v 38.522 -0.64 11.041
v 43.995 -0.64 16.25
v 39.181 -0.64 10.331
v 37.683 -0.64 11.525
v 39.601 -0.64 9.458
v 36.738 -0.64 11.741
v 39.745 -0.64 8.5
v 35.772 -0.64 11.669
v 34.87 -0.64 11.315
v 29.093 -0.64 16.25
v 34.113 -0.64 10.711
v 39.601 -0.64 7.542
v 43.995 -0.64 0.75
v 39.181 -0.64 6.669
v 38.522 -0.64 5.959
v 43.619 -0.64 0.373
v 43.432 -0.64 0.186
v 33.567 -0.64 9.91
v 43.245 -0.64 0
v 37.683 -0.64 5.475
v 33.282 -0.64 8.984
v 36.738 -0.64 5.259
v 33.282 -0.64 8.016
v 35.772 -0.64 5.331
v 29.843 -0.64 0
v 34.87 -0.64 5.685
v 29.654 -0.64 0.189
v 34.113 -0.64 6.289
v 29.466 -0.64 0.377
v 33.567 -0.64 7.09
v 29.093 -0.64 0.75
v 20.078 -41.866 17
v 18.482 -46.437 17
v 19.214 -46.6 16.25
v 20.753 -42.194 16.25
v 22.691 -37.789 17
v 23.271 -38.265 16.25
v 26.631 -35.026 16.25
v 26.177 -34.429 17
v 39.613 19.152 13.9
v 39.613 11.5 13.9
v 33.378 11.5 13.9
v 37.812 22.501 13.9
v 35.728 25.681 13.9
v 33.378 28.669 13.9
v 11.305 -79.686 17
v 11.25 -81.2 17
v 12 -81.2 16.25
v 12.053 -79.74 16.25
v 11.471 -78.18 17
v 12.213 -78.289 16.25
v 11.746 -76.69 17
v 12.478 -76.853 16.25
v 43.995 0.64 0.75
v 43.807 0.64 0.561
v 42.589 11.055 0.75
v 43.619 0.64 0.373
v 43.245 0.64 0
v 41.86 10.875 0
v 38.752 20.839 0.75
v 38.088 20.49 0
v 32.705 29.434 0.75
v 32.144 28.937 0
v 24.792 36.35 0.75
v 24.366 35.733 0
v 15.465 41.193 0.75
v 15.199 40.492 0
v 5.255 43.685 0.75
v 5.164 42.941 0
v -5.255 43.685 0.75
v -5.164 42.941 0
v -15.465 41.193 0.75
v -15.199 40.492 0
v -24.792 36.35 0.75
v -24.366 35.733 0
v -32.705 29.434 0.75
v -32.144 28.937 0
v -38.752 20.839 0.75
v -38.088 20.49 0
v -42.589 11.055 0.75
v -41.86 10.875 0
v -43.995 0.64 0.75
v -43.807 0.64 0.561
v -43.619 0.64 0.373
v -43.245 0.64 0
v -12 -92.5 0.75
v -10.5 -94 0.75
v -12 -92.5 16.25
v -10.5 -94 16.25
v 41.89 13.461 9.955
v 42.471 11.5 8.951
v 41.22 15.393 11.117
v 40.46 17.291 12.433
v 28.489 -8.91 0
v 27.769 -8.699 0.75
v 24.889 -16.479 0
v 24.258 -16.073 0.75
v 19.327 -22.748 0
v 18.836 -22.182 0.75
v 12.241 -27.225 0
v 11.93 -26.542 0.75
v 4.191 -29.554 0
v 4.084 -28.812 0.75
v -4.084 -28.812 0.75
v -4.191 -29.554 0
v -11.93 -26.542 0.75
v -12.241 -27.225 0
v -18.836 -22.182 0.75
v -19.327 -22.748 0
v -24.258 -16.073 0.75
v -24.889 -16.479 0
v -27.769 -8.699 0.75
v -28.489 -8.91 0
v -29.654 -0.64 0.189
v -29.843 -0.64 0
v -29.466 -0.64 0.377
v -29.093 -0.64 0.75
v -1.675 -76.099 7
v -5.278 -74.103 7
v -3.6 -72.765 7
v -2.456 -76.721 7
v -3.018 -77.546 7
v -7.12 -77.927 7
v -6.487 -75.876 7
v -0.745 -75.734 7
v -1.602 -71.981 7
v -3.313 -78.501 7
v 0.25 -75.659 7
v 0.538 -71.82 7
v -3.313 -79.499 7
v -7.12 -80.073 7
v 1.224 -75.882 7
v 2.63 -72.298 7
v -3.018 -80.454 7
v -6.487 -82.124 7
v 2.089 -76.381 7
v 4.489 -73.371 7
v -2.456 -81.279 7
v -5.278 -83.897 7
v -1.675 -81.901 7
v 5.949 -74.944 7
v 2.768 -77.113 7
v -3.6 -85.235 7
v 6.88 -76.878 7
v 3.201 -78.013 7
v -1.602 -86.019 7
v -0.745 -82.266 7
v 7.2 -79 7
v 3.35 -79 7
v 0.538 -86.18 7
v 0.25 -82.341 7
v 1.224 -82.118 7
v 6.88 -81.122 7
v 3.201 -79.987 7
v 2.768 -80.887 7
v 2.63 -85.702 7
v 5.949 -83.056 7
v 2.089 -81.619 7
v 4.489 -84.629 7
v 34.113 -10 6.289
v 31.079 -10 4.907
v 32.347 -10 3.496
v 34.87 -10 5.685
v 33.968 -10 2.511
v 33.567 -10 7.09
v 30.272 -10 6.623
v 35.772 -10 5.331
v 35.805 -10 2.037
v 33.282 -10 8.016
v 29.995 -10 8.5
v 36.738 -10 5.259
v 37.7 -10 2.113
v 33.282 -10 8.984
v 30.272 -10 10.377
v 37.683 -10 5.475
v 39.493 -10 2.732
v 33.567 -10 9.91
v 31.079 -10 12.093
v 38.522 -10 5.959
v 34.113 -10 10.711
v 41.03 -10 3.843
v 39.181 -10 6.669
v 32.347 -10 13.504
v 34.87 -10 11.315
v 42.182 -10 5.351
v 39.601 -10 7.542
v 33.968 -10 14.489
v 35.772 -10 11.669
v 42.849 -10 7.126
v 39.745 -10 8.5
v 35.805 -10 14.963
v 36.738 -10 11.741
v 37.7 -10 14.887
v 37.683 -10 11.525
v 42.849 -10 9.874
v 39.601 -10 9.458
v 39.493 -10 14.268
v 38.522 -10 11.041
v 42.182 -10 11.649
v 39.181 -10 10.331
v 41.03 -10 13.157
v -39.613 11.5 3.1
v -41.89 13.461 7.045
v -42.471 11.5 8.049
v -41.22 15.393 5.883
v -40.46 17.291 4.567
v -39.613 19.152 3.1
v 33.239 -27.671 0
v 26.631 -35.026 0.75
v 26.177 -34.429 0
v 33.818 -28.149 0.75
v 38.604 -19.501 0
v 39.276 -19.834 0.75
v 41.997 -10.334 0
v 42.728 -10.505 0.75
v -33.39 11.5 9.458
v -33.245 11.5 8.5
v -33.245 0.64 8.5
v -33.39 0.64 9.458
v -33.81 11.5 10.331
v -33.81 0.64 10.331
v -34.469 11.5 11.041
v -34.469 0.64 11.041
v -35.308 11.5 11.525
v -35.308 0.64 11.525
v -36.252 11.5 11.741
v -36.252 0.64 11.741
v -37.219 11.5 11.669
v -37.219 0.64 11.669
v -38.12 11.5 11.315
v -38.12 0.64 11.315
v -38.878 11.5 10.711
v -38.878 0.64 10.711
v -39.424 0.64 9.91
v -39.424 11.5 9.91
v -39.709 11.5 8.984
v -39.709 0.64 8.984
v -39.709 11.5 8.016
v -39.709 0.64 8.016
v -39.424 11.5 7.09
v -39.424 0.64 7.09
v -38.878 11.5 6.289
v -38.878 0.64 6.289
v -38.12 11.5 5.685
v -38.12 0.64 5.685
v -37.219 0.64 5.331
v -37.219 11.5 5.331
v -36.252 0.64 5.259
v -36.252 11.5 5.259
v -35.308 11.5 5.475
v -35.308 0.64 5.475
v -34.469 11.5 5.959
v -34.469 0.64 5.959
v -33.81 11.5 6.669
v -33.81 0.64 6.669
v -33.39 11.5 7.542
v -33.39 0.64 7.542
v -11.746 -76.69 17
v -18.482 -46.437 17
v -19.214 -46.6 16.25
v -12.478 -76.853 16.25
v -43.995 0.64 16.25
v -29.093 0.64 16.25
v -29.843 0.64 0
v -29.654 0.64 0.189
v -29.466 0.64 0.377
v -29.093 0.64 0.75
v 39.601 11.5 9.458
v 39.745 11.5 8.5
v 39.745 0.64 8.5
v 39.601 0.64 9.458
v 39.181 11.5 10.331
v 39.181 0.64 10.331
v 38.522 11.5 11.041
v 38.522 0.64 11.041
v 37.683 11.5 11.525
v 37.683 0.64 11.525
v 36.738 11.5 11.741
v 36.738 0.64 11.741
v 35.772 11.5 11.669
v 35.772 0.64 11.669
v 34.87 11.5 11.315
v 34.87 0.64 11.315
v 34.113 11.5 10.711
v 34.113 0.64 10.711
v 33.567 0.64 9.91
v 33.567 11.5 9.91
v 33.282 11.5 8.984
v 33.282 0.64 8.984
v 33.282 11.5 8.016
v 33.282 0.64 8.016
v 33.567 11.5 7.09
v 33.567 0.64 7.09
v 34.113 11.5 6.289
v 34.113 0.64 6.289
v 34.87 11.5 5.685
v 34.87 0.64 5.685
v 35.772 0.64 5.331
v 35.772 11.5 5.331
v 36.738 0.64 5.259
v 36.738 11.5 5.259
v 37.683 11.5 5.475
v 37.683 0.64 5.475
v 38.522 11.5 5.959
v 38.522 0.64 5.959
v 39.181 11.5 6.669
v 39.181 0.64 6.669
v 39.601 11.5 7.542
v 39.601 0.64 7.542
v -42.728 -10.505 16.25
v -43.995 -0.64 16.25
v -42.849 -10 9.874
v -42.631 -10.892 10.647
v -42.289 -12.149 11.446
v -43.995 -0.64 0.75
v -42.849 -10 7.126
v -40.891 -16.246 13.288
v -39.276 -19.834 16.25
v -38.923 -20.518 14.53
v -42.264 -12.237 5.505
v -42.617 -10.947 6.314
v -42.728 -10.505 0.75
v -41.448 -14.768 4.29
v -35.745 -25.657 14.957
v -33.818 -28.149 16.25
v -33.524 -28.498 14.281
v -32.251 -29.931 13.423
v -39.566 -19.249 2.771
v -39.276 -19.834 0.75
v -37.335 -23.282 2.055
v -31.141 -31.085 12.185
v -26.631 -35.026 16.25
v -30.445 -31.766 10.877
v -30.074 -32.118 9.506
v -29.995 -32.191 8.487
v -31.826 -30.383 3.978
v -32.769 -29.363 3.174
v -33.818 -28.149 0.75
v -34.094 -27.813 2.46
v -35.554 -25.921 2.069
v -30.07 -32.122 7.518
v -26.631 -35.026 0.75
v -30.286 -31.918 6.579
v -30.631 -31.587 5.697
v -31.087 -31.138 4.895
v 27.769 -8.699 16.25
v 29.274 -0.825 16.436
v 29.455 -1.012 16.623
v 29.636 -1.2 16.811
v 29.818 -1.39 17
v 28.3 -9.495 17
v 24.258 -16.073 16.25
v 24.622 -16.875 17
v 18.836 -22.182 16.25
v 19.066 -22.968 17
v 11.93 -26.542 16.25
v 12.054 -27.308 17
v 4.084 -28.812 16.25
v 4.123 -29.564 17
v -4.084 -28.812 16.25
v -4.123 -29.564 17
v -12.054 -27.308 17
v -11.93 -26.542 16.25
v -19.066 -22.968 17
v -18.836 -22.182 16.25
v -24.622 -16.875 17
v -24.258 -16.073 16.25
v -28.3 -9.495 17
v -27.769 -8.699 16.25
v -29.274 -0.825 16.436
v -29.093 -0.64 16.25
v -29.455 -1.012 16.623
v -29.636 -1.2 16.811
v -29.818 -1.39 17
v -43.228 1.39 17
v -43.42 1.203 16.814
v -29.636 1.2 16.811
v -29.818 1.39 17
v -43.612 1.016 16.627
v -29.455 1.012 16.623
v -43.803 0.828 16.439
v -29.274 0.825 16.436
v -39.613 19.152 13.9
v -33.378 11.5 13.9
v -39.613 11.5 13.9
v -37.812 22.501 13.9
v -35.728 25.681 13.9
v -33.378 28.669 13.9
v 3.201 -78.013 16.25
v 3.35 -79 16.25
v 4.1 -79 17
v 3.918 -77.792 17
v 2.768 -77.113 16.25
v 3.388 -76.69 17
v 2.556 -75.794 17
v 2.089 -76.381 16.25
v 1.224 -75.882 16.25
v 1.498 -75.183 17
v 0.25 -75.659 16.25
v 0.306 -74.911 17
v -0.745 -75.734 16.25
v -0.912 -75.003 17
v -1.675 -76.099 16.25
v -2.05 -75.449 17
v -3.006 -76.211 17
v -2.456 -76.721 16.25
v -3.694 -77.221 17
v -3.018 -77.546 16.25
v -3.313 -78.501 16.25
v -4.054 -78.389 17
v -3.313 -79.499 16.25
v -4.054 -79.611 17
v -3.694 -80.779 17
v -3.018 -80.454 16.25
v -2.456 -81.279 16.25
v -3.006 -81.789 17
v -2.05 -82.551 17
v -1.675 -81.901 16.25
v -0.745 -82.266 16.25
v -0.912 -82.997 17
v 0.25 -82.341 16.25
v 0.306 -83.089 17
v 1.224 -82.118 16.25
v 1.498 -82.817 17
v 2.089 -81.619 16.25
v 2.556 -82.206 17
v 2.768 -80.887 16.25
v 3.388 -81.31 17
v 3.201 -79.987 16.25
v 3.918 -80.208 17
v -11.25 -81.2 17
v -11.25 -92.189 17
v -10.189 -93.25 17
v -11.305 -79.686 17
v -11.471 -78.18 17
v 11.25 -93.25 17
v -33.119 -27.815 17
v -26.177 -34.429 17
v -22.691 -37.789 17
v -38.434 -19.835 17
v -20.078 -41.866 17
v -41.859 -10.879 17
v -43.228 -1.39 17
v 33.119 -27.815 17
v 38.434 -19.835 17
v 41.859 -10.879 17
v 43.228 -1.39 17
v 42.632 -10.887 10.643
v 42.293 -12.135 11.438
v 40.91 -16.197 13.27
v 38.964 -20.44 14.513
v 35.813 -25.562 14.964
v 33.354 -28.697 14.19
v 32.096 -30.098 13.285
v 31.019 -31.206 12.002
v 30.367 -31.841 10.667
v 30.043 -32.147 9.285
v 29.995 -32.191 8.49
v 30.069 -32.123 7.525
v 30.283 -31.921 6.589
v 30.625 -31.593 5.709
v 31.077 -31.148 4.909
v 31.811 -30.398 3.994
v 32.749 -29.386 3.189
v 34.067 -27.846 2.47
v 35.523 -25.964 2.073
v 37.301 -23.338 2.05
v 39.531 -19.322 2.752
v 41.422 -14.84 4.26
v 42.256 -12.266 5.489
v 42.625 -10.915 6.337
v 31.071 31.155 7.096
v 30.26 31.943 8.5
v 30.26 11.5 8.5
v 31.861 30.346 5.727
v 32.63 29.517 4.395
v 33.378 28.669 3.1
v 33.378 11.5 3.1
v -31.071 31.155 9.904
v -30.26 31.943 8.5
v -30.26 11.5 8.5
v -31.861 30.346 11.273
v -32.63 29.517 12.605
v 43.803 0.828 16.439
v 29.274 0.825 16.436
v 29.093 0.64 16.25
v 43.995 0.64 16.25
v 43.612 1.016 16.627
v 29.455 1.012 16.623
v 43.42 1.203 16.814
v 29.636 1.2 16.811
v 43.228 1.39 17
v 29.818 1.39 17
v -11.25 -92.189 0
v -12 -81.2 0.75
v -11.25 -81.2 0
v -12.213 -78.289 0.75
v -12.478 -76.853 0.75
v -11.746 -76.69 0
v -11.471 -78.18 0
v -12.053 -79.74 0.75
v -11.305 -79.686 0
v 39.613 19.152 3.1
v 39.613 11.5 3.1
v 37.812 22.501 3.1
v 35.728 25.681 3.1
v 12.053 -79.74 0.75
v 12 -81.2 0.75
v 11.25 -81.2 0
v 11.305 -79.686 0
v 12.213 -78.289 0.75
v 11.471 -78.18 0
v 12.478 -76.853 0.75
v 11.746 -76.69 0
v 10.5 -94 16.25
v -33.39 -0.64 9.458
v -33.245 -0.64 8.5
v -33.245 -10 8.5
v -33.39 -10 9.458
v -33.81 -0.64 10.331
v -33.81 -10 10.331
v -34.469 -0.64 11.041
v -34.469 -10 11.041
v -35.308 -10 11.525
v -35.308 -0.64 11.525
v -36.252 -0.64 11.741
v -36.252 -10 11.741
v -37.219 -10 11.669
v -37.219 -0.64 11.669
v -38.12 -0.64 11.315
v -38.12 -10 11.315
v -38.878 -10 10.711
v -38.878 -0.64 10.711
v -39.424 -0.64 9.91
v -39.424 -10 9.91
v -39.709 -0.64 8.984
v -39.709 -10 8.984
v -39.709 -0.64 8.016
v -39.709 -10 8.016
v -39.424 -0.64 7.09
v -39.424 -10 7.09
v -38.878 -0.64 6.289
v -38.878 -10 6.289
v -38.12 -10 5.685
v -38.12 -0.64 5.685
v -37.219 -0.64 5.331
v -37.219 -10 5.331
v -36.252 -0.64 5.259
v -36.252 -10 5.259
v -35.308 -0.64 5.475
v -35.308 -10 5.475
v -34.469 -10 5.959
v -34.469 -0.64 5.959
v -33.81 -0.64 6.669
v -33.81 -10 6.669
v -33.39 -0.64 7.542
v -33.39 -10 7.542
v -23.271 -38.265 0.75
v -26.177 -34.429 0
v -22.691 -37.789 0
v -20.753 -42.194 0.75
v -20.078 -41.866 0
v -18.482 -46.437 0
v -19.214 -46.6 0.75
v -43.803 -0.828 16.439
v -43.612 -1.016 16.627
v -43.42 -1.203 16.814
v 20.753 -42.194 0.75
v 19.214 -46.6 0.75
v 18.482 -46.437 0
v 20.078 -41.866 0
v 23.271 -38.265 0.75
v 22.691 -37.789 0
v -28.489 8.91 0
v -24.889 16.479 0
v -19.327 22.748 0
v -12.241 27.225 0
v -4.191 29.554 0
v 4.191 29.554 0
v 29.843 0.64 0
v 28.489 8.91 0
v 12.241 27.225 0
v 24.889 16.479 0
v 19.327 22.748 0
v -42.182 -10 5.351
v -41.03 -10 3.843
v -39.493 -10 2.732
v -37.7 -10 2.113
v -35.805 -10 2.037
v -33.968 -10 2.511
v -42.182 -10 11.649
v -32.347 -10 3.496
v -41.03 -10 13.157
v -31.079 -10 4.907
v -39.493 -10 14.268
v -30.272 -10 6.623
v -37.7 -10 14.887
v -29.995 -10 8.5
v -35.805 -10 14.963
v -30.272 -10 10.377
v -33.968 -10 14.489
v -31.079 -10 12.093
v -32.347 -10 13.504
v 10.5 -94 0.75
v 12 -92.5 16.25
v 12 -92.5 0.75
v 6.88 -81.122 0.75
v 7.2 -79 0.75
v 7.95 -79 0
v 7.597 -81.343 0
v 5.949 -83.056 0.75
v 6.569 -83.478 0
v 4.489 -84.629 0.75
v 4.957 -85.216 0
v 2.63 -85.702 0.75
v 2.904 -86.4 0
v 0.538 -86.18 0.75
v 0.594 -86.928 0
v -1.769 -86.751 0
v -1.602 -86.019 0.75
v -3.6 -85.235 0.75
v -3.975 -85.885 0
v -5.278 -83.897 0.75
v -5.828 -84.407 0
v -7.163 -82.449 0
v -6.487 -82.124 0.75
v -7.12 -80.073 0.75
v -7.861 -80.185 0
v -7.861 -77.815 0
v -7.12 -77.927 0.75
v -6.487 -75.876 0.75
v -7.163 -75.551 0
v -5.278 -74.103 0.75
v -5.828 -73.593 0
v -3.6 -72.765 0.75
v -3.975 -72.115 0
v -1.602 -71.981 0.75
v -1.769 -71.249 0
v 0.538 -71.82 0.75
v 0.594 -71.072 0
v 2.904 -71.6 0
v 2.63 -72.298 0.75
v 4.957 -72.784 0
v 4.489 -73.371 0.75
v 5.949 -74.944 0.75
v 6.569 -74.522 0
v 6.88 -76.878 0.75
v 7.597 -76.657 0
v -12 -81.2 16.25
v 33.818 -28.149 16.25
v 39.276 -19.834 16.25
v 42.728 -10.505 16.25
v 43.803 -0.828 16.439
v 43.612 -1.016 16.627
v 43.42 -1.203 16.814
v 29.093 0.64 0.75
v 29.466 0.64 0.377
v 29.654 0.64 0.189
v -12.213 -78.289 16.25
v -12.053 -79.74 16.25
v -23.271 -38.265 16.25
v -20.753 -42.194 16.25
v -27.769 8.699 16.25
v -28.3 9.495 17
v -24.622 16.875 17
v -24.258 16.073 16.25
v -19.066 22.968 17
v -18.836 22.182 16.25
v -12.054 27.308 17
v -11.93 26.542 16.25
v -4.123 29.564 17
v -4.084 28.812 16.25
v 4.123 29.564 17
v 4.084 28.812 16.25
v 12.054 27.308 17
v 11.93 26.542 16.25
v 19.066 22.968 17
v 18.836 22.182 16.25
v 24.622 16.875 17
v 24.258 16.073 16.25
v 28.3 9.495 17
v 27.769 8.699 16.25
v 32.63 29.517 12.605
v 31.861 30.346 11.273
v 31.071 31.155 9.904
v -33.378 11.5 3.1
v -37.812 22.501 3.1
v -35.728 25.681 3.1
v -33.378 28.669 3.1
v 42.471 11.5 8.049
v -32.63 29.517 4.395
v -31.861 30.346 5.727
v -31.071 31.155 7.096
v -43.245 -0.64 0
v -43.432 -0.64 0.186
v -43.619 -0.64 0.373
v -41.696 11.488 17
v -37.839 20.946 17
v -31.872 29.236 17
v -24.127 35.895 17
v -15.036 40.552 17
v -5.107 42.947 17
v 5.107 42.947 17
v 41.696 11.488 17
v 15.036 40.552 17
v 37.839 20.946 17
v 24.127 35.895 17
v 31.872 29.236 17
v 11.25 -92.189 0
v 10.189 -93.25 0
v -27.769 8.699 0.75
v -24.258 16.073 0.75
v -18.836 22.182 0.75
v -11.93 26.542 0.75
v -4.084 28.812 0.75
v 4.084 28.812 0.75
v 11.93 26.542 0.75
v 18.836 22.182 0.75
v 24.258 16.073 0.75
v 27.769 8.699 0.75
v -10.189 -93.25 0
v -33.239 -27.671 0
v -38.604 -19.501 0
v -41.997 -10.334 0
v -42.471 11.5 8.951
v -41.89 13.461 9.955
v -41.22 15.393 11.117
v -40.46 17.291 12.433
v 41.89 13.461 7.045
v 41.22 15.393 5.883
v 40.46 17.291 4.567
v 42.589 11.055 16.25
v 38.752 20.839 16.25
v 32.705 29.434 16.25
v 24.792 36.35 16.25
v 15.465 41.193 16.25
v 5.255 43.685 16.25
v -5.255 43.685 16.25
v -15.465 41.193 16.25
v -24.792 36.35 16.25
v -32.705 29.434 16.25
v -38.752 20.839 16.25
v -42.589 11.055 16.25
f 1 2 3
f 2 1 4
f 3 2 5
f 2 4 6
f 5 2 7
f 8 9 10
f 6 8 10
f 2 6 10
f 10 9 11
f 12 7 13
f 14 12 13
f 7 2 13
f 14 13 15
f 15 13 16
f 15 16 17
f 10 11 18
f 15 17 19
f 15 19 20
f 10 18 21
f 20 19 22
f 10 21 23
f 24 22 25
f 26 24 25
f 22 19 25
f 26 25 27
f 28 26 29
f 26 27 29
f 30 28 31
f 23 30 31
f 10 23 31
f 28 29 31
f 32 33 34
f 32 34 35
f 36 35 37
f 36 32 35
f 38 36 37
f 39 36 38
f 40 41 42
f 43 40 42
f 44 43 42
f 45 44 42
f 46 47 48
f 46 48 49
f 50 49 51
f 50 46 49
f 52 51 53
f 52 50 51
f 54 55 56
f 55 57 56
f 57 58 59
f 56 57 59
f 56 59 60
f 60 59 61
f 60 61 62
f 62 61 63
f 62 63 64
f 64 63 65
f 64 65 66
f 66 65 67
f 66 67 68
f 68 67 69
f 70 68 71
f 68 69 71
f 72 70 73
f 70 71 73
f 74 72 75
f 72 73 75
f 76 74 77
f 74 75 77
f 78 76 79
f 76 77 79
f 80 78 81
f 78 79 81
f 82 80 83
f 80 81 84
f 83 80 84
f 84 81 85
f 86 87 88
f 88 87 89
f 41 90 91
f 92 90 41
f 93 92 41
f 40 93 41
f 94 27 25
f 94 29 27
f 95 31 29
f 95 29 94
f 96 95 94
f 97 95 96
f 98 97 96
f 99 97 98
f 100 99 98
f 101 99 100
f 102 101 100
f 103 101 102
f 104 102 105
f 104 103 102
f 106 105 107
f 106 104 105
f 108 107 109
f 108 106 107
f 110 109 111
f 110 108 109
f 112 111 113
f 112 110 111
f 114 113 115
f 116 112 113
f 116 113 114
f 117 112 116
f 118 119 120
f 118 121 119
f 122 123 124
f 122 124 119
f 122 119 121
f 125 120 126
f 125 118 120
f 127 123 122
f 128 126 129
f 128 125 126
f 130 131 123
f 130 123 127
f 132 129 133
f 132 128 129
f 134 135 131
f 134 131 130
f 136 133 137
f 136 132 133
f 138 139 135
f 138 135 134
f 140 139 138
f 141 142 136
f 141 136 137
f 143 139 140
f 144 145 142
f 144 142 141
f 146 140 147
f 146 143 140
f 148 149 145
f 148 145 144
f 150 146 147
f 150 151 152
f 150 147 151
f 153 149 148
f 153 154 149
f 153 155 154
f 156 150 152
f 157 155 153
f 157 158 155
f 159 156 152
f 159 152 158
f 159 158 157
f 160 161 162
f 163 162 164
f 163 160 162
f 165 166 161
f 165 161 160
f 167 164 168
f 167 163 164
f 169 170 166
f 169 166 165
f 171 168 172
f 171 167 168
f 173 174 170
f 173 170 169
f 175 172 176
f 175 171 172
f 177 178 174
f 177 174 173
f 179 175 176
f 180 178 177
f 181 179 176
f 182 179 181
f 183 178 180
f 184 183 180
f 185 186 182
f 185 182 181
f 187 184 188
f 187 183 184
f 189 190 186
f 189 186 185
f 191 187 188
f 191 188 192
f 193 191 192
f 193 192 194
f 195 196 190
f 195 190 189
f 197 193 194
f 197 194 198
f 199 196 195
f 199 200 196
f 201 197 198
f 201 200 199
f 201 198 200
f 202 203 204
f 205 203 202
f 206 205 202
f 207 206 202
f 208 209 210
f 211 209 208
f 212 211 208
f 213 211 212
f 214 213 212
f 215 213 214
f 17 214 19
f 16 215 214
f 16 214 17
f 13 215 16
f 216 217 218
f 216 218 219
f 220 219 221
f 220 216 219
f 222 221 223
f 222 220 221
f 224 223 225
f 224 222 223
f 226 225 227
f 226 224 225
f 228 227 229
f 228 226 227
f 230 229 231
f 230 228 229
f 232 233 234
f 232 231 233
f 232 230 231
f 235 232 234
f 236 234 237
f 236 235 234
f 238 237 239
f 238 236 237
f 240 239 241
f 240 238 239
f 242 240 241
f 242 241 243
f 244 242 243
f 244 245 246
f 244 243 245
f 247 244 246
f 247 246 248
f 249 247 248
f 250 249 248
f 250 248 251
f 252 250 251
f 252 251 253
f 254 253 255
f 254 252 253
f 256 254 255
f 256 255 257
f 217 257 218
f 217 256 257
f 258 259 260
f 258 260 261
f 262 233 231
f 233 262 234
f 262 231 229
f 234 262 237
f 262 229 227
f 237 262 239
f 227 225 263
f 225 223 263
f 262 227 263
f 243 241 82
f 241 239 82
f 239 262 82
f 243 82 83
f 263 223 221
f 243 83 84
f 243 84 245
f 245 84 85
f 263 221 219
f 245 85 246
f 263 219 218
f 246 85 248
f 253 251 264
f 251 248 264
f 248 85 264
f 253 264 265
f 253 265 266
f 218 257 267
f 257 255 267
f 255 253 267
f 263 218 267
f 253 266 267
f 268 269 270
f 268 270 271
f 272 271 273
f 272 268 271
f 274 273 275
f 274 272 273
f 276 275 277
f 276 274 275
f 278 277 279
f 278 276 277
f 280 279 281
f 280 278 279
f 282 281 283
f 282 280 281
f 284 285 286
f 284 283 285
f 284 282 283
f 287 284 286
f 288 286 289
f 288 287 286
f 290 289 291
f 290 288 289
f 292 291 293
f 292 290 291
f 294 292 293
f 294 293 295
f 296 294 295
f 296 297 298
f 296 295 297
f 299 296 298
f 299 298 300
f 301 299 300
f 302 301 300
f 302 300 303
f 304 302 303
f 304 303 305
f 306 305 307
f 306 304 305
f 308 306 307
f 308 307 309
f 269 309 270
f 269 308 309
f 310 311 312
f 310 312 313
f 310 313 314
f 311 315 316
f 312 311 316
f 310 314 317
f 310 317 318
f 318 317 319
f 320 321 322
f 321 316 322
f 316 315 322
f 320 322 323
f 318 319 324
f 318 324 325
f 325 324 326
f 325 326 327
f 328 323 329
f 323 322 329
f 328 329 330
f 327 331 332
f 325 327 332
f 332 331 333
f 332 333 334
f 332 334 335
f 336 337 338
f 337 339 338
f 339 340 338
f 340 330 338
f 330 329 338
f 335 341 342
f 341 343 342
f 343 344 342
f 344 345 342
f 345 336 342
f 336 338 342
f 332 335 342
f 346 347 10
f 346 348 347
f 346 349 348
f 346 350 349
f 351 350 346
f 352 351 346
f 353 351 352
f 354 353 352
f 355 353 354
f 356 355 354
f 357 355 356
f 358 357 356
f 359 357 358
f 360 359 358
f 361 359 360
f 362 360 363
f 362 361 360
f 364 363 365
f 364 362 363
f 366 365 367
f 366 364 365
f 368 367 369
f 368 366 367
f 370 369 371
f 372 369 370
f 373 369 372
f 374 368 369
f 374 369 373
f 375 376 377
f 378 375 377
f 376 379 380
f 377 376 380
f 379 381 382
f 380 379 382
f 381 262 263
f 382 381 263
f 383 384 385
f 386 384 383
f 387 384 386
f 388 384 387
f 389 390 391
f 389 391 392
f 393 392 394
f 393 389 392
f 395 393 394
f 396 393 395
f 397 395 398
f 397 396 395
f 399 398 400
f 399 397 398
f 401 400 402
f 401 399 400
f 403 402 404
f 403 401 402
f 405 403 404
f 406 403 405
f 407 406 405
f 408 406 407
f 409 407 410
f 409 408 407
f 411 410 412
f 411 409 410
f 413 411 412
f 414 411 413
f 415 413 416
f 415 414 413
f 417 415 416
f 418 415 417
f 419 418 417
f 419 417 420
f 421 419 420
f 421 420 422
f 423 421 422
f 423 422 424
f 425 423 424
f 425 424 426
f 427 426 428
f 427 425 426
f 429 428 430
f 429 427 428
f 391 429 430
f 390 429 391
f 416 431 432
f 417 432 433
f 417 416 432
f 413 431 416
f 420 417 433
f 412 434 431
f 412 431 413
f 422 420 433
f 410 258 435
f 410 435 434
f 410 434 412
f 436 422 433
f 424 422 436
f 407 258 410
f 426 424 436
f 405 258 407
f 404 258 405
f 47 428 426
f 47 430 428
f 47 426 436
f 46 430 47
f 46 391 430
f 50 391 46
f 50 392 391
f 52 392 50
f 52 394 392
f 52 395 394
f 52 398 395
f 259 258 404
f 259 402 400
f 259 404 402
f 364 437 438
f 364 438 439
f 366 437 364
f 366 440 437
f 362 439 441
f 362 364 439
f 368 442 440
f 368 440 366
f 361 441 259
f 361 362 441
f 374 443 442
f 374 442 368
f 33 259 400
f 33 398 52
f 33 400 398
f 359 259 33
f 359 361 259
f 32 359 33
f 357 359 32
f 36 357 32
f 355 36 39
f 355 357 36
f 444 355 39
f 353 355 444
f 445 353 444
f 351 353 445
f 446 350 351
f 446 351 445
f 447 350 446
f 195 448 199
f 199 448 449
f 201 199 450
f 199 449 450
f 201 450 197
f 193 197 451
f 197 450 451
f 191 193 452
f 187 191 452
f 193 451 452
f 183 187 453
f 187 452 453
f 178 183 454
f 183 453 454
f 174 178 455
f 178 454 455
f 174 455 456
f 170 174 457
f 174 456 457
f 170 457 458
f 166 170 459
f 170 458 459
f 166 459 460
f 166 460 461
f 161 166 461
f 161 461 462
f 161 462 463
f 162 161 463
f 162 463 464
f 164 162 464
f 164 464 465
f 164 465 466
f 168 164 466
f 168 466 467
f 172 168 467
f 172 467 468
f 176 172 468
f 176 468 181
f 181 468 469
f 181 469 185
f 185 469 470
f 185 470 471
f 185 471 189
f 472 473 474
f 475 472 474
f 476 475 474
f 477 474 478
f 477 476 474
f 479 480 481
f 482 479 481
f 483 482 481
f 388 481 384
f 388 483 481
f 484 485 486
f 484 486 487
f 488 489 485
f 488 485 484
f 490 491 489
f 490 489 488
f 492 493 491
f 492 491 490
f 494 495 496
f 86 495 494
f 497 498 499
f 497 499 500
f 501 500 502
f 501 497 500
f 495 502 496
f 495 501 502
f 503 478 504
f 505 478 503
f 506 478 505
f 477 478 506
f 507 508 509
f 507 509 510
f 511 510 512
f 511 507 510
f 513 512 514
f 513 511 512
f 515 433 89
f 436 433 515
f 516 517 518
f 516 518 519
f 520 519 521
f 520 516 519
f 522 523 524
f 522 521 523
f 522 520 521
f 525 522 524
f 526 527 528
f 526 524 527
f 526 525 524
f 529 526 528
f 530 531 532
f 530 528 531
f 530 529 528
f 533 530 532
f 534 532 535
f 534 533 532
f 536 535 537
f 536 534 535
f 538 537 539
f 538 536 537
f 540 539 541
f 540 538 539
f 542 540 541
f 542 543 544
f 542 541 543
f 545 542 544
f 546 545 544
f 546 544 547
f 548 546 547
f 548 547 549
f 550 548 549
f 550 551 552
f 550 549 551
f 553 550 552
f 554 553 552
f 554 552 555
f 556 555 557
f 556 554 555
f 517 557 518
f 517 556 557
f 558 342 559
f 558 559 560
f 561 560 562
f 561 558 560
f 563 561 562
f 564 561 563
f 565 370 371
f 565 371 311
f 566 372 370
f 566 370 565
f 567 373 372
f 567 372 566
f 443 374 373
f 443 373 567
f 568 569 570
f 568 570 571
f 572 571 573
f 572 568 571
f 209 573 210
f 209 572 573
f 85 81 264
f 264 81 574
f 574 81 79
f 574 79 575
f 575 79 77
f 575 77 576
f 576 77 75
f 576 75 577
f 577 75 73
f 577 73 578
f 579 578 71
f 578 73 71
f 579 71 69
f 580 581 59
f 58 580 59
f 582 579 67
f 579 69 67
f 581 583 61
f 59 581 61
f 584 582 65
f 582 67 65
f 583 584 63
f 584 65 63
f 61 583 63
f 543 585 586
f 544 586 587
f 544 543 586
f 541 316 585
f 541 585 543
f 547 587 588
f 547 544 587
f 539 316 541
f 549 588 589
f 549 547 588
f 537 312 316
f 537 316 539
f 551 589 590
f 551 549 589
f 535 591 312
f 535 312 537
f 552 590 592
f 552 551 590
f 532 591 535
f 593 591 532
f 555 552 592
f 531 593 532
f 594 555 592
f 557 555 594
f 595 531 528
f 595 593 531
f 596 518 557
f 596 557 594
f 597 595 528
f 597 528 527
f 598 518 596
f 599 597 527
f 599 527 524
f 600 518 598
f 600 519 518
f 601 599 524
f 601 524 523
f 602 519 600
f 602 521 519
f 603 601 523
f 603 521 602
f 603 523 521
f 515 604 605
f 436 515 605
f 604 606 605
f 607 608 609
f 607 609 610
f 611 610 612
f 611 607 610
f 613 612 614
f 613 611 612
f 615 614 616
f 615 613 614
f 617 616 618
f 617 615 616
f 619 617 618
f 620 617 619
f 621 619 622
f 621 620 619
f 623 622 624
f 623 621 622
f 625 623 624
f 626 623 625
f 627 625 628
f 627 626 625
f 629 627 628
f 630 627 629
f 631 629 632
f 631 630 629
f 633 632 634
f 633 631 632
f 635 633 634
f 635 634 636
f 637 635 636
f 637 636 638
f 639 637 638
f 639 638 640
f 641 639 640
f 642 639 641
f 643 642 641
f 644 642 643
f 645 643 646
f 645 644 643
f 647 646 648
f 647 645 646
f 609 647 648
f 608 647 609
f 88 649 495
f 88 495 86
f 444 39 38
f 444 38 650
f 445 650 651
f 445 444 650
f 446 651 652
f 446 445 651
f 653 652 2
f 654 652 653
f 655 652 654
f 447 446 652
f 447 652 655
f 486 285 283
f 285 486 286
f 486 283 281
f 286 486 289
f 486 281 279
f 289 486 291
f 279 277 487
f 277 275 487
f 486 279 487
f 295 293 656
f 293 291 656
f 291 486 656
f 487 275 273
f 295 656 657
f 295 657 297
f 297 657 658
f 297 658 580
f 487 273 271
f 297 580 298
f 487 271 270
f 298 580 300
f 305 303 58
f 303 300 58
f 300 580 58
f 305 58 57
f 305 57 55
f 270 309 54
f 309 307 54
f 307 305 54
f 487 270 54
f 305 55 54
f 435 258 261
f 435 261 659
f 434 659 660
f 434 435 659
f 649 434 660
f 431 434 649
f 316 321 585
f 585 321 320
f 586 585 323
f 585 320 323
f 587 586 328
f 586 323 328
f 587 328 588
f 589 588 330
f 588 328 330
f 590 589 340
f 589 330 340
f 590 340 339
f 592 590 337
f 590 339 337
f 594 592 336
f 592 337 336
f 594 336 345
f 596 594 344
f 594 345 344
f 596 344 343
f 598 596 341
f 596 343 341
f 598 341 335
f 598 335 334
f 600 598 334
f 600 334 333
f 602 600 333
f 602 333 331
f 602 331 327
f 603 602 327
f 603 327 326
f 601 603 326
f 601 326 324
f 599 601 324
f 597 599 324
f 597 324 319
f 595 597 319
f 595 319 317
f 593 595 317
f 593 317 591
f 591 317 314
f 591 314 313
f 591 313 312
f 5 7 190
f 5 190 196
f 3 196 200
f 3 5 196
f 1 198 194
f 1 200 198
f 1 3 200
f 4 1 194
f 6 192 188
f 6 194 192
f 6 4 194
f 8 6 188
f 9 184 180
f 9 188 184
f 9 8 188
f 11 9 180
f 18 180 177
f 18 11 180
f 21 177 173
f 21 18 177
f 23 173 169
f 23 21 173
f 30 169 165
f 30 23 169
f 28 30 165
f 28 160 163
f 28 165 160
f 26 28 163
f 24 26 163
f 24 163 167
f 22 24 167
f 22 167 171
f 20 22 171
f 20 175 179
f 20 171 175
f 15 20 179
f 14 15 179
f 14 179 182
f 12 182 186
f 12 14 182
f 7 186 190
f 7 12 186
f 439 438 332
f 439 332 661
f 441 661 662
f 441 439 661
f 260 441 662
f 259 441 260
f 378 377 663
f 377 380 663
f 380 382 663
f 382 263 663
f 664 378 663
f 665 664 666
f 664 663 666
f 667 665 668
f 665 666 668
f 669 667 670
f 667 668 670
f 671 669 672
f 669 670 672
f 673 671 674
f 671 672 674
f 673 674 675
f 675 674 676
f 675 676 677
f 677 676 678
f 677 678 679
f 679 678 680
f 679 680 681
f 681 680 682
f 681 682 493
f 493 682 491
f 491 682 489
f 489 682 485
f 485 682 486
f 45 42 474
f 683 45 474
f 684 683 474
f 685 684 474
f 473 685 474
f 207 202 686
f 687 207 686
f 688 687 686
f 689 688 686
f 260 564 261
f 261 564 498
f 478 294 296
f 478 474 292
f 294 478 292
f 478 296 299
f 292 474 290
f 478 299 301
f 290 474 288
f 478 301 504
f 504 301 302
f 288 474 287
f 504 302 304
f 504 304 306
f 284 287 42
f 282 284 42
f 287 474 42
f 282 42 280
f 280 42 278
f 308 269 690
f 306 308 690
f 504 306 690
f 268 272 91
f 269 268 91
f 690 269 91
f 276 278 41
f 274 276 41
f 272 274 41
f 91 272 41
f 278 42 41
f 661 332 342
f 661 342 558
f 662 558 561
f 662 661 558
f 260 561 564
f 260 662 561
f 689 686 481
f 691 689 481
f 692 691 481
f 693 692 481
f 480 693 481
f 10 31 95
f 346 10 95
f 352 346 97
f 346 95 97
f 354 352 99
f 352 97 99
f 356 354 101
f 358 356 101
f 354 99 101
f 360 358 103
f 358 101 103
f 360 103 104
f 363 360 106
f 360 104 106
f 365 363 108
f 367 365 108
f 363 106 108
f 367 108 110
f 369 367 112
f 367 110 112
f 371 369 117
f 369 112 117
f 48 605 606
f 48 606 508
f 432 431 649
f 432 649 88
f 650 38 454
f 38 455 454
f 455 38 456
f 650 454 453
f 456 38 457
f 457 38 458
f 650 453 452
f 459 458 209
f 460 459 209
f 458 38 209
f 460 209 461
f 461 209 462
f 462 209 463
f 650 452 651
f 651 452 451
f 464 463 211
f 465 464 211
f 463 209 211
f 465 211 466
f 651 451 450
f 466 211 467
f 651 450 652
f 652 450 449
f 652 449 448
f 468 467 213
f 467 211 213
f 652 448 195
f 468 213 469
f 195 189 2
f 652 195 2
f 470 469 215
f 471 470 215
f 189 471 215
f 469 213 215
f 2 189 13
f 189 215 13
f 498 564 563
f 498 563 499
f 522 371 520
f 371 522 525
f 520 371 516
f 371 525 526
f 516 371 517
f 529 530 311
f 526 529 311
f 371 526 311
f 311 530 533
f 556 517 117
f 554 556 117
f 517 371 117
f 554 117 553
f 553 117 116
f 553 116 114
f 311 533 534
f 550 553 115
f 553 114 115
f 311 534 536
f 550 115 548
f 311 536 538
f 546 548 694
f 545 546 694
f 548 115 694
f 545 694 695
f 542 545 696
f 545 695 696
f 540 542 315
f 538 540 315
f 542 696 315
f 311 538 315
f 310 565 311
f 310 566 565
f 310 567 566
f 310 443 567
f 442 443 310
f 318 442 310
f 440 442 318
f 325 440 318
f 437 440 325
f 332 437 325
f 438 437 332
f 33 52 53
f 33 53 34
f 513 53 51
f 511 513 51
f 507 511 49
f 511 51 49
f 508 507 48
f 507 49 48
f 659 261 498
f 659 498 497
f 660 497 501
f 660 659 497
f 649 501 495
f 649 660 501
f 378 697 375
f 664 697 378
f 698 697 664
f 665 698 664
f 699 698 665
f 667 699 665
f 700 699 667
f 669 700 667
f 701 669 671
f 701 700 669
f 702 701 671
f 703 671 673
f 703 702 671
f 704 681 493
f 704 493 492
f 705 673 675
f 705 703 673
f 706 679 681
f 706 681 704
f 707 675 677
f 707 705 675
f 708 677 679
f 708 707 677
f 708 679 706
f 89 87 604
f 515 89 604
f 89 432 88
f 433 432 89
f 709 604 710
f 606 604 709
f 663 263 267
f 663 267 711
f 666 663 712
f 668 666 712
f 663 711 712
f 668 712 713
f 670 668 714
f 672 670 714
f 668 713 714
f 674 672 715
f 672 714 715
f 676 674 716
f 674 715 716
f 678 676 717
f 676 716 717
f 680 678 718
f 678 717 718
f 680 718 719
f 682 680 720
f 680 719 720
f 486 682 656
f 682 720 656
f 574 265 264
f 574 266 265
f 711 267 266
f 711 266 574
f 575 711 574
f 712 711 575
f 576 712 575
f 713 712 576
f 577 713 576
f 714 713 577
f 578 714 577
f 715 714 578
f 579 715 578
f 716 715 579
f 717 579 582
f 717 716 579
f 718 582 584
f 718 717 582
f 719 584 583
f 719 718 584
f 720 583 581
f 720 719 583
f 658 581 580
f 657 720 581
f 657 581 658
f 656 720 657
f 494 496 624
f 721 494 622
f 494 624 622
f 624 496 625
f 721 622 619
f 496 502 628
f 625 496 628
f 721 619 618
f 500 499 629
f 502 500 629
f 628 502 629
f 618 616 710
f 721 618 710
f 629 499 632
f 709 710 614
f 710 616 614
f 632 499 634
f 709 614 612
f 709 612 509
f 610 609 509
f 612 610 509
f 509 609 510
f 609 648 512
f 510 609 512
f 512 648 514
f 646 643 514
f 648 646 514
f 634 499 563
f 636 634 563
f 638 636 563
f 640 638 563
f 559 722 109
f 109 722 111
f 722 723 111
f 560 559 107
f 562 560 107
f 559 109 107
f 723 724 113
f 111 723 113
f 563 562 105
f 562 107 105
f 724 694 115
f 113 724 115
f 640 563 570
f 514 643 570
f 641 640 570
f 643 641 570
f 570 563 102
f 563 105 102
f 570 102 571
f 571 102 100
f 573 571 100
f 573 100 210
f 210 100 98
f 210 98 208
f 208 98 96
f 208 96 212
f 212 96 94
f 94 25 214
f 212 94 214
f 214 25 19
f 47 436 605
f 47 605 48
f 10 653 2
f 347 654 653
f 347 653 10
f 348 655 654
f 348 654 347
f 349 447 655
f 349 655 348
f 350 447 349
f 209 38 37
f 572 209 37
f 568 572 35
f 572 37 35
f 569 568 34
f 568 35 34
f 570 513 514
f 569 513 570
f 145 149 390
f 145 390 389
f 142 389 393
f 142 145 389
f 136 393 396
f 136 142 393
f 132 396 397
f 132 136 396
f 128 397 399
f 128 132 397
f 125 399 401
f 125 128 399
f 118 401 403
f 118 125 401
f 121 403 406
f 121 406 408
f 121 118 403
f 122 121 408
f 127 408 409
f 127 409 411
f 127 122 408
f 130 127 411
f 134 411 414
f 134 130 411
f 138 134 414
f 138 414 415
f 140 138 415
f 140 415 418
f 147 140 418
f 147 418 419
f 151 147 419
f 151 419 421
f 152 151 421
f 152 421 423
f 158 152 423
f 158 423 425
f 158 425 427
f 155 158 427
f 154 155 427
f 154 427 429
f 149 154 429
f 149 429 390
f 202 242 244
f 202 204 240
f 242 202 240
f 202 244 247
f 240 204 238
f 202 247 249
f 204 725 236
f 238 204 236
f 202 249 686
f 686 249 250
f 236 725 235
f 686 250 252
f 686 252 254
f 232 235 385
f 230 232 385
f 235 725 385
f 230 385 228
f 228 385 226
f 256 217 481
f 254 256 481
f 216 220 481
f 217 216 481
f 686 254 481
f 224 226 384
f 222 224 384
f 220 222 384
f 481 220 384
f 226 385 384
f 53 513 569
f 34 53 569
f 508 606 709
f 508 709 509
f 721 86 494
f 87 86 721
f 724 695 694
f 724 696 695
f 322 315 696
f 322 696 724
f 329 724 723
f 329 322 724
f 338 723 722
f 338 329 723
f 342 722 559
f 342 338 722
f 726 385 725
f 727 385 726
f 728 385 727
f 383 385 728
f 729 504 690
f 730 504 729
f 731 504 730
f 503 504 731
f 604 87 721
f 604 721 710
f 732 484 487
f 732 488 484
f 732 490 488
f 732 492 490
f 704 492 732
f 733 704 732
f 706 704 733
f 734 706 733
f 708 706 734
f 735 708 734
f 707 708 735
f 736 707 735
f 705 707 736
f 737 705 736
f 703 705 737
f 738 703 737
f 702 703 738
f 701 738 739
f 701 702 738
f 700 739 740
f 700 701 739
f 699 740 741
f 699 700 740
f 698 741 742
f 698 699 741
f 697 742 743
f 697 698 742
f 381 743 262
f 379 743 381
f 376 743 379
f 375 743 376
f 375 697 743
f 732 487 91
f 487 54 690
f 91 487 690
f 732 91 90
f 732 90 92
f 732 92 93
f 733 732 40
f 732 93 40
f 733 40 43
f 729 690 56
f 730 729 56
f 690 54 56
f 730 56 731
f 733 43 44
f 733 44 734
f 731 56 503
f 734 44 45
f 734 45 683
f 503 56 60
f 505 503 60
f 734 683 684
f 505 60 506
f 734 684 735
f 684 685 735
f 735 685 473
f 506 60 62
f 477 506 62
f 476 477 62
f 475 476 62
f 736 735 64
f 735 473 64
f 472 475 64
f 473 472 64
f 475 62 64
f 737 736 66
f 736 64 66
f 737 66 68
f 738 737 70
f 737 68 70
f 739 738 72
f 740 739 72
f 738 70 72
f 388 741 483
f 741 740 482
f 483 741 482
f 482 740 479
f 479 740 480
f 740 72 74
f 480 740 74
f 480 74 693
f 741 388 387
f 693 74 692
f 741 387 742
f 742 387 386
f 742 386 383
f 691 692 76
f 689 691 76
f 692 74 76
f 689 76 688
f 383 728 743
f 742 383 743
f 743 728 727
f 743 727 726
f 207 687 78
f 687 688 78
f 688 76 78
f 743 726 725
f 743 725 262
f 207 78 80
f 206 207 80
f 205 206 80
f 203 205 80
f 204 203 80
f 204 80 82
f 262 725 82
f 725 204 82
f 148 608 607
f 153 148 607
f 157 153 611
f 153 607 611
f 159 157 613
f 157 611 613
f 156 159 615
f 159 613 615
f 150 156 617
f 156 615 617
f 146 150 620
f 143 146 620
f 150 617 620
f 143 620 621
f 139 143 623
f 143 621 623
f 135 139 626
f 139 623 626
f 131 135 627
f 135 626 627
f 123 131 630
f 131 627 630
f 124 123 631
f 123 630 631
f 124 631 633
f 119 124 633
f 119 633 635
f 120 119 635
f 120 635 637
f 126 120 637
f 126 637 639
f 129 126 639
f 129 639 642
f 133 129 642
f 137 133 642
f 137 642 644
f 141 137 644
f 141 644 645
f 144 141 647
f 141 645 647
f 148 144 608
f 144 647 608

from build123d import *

# Parameters (mm, degrees)
F0_R       = 3.35
F1_DEPTH   = 17
F2_R       = 7.2
F3_DEPTH   = 7
F4_R       = 20
F6_R       = 3.25
F7_DEPTH   = 100
F9_DEPTH   = 38.5
F11_R      = 6.5
F12_DEPTH  = 30
F13_SIZE   = 1.5
F14_SIZE   = 0.74999
F14_2_SIZE = 0.74999


# Not quite as in the source:
# - a fillet or chamfer is up to 0.001 mm smaller than in the source, because OpenCascade refuses the exact size


with BuildPart() as f1:
    # F0 (on Top) → F1 (new body)
    with BuildSketch(Plane.XY):
        with BuildLine():
            ThreePointArc((29.0929715762, -0.6395348837), (0, -29.1), (-29.0929715762, -0.6395348837))
            Line((-29.0929715762, -0.6395348837), (-43.9953519719, -0.6395348837))
            ThreePointArc((-43.9953519719, -0.6395348837), (-37.6443034661, -22.7795174785), (-20.9777310227, -38.6773163643))
            Line((-20.9777310227, -38.6773163643), (-12, -79))
            Line((-12, -79), (-12, -94))
            Line((-12, -94), (12, -94))
            Line((12, -94), (12, -79))
            Line((12, -79), (20.9777310227, -38.6773163643))
            ThreePointArc((20.9777310227, -38.6773163643), (37.6443034661, -22.7795174785), (43.9953519719, -0.6395348837))
            Line((43.9953519719, -0.6395348837), (29.0929715762, -0.6395348837))
        make_face()
        with Locations((0, -79)):
            Circle(F0_R, mode=Mode.SUBTRACT)
    extrude(amount=F1_DEPTH)

    # F2 (on face) → F3 (cut)
    with BuildSketch(Plane(origin=(0, 0, 0), x_dir=(1, 0, 0), z_dir=(0, 0, -1))):
        with Locations((0, 79)):
            Circle(F2_R)
    extrude(amount=-F3_DEPTH, mode=Mode.SUBTRACT)

    # F4
    f4_edges = [f1.edges().sort_by_distance(p)[0] for p in [
        (-20.977731, -38.677316, 8.5),
        (-12, -79, 8.5),
        (20.977731, -38.677316, 8.5),
        (12, -79, 8.5),
    ]]
    fillet(f4_edges, radius=F4_R)


with BuildPart() as f1b:
    # F0 (on Top) → F1, piece 2 (new body)
    with BuildSketch(Plane.XY):
        with BuildLine():
            ThreePointArc((43.9953519719, 0.6395348837), (0, 44), (-43.9953519719, 0.6395348837))
            Line((-43.9953519719, 0.6395348837), (-29.0929715762, 0.6395348837))
            ThreePointArc((-29.0929715762, 0.6395348837), (0, 29.1), (29.0929715762, 0.6395348837))
            Line((29.0929715762, 0.6395348837), (43.9953519719, 0.6395348837))
        make_face()
    extrude(amount=F1_DEPTH)


with BuildPart() as f7_tool:
    # F6 (on offset) → F7 (new body)
    with BuildSketch(Plane.XZ.offset(-50)):
        with Locations((36.4953519719, 8.5)):
            Circle(F6_R)
        with Locations((-36.4953519719, 8.5)):
            Circle(F6_R)
    extrude(amount=F7_DEPTH)


with BuildPart() as f1_1:
    add(f1.part)

    # F7: cut by f7_tool
    add(f7_tool.part, mode=Mode.SUBTRACT)

    # F11 (on offset) → F12 (cut)
    with BuildSketch(Plane.XZ.offset(40)):
        with Locations((-36.4953519719, 8.5)):
            Circle(F11_R)
        with Locations((36.4953519719, 8.5)):
            Circle(F11_R)
    extrude(amount=-F12_DEPTH, mode=Mode.SUBTRACT)

    # F13
    f13_edges = [f1_1.edges().sort_by_distance(p)[0] for p in [
        (-12, -94, 8.5),
        (12, -94, 8.5),
    ]]
    chamfer(f13_edges, length=F13_SIZE)

    # F14 (size 0.75 in the source; OpenCascade refuses exactly that, so slightly less here)
    f14_edges = [f1_1.edges().sort_by_distance(p)[0] for p in [
        (-3.35, -79, 17),
        (0, -29.1, 17),
        (36.544162, -0.639535, 17),
        (-36.544162, -0.639535, 17),
        (-7.2, -79, 0),
        (0, -29.1, 0),
        (39.276157, -19.833898, 0),
        (21.89664, -40.155533, 0),
        (15.8459, -61.726481, 0),
        (12, -86.849771, 0),
        (12.119863, -79.013182, 0),
        (11.25, -93.25, 0),
        (0, -94, 0),
        (-11.25, -93.25, 0),
        (-12, -86.849771, 0),
        (-12.119863, -79.013182, 0),
        (-15.8459, -61.726481, 0),
        (-21.89664, -40.155533, 0),
        (-39.276157, -19.833898, 0),
        (15.8459, -61.726481, 17),
        (21.89664, -40.155533, 17),
        (39.276157, -19.833898, 17),
        (-15.8459, -61.726481, 17),
        (-12, -86.849771, 17),
        (-12.119863, -79.013182, 17),
        (-11.25, -93.25, 17),
        (0, -94, 17),
        (12, -86.849771, 17),
        (-39.276157, -19.833898, 17),
        (-21.89664, -40.155533, 17),
    ]]
    chamfer(f14_edges, length=F14_SIZE)


with BuildPart() as f1b_1:
    add(f1b.part)

    # F7: cut by f7_tool
    add(f7_tool.part, mode=Mode.SUBTRACT)

    # F8 (on offset) → F9 (cut)
    with BuildSketch(Plane.XZ.offset(-50)):
        Polygon((30.2599690647, 8.5), (33.3776605183, 3.1), (39.6130434255, 3.1), (42.7307348792, 8.5), (39.6130434255, 13.9), (33.3776605183, 13.9), align=None)
        Polygon((-42.7307348792, 8.5), (-39.6130434255, 3.1), (-33.3776605183, 3.1), (-30.2599690647, 8.5), (-33.3776605183, 13.9), (-39.6130434255, 13.9), align=None)
    extrude(amount=F9_DEPTH, mode=Mode.SUBTRACT)

    # F14#2 (size 0.75 in the source; OpenCascade refuses exactly that, so slightly less here)
    f14_2_edges = [f1b_1.edges().sort_by_distance(p)[0] for p in [
        (0, 29.1, 17),
        (36.544162, 0.639535, 17),
        (-36.544162, 0.639535, 17),
        (0, 29.1, 0),
        (0, 44, 0),
        (0, 44, 17),
    ]]
    chamfer(f14_2_edges, length=F14_2_SIZE)


solid = Compound([f1_1.part, f1b_1.part])
